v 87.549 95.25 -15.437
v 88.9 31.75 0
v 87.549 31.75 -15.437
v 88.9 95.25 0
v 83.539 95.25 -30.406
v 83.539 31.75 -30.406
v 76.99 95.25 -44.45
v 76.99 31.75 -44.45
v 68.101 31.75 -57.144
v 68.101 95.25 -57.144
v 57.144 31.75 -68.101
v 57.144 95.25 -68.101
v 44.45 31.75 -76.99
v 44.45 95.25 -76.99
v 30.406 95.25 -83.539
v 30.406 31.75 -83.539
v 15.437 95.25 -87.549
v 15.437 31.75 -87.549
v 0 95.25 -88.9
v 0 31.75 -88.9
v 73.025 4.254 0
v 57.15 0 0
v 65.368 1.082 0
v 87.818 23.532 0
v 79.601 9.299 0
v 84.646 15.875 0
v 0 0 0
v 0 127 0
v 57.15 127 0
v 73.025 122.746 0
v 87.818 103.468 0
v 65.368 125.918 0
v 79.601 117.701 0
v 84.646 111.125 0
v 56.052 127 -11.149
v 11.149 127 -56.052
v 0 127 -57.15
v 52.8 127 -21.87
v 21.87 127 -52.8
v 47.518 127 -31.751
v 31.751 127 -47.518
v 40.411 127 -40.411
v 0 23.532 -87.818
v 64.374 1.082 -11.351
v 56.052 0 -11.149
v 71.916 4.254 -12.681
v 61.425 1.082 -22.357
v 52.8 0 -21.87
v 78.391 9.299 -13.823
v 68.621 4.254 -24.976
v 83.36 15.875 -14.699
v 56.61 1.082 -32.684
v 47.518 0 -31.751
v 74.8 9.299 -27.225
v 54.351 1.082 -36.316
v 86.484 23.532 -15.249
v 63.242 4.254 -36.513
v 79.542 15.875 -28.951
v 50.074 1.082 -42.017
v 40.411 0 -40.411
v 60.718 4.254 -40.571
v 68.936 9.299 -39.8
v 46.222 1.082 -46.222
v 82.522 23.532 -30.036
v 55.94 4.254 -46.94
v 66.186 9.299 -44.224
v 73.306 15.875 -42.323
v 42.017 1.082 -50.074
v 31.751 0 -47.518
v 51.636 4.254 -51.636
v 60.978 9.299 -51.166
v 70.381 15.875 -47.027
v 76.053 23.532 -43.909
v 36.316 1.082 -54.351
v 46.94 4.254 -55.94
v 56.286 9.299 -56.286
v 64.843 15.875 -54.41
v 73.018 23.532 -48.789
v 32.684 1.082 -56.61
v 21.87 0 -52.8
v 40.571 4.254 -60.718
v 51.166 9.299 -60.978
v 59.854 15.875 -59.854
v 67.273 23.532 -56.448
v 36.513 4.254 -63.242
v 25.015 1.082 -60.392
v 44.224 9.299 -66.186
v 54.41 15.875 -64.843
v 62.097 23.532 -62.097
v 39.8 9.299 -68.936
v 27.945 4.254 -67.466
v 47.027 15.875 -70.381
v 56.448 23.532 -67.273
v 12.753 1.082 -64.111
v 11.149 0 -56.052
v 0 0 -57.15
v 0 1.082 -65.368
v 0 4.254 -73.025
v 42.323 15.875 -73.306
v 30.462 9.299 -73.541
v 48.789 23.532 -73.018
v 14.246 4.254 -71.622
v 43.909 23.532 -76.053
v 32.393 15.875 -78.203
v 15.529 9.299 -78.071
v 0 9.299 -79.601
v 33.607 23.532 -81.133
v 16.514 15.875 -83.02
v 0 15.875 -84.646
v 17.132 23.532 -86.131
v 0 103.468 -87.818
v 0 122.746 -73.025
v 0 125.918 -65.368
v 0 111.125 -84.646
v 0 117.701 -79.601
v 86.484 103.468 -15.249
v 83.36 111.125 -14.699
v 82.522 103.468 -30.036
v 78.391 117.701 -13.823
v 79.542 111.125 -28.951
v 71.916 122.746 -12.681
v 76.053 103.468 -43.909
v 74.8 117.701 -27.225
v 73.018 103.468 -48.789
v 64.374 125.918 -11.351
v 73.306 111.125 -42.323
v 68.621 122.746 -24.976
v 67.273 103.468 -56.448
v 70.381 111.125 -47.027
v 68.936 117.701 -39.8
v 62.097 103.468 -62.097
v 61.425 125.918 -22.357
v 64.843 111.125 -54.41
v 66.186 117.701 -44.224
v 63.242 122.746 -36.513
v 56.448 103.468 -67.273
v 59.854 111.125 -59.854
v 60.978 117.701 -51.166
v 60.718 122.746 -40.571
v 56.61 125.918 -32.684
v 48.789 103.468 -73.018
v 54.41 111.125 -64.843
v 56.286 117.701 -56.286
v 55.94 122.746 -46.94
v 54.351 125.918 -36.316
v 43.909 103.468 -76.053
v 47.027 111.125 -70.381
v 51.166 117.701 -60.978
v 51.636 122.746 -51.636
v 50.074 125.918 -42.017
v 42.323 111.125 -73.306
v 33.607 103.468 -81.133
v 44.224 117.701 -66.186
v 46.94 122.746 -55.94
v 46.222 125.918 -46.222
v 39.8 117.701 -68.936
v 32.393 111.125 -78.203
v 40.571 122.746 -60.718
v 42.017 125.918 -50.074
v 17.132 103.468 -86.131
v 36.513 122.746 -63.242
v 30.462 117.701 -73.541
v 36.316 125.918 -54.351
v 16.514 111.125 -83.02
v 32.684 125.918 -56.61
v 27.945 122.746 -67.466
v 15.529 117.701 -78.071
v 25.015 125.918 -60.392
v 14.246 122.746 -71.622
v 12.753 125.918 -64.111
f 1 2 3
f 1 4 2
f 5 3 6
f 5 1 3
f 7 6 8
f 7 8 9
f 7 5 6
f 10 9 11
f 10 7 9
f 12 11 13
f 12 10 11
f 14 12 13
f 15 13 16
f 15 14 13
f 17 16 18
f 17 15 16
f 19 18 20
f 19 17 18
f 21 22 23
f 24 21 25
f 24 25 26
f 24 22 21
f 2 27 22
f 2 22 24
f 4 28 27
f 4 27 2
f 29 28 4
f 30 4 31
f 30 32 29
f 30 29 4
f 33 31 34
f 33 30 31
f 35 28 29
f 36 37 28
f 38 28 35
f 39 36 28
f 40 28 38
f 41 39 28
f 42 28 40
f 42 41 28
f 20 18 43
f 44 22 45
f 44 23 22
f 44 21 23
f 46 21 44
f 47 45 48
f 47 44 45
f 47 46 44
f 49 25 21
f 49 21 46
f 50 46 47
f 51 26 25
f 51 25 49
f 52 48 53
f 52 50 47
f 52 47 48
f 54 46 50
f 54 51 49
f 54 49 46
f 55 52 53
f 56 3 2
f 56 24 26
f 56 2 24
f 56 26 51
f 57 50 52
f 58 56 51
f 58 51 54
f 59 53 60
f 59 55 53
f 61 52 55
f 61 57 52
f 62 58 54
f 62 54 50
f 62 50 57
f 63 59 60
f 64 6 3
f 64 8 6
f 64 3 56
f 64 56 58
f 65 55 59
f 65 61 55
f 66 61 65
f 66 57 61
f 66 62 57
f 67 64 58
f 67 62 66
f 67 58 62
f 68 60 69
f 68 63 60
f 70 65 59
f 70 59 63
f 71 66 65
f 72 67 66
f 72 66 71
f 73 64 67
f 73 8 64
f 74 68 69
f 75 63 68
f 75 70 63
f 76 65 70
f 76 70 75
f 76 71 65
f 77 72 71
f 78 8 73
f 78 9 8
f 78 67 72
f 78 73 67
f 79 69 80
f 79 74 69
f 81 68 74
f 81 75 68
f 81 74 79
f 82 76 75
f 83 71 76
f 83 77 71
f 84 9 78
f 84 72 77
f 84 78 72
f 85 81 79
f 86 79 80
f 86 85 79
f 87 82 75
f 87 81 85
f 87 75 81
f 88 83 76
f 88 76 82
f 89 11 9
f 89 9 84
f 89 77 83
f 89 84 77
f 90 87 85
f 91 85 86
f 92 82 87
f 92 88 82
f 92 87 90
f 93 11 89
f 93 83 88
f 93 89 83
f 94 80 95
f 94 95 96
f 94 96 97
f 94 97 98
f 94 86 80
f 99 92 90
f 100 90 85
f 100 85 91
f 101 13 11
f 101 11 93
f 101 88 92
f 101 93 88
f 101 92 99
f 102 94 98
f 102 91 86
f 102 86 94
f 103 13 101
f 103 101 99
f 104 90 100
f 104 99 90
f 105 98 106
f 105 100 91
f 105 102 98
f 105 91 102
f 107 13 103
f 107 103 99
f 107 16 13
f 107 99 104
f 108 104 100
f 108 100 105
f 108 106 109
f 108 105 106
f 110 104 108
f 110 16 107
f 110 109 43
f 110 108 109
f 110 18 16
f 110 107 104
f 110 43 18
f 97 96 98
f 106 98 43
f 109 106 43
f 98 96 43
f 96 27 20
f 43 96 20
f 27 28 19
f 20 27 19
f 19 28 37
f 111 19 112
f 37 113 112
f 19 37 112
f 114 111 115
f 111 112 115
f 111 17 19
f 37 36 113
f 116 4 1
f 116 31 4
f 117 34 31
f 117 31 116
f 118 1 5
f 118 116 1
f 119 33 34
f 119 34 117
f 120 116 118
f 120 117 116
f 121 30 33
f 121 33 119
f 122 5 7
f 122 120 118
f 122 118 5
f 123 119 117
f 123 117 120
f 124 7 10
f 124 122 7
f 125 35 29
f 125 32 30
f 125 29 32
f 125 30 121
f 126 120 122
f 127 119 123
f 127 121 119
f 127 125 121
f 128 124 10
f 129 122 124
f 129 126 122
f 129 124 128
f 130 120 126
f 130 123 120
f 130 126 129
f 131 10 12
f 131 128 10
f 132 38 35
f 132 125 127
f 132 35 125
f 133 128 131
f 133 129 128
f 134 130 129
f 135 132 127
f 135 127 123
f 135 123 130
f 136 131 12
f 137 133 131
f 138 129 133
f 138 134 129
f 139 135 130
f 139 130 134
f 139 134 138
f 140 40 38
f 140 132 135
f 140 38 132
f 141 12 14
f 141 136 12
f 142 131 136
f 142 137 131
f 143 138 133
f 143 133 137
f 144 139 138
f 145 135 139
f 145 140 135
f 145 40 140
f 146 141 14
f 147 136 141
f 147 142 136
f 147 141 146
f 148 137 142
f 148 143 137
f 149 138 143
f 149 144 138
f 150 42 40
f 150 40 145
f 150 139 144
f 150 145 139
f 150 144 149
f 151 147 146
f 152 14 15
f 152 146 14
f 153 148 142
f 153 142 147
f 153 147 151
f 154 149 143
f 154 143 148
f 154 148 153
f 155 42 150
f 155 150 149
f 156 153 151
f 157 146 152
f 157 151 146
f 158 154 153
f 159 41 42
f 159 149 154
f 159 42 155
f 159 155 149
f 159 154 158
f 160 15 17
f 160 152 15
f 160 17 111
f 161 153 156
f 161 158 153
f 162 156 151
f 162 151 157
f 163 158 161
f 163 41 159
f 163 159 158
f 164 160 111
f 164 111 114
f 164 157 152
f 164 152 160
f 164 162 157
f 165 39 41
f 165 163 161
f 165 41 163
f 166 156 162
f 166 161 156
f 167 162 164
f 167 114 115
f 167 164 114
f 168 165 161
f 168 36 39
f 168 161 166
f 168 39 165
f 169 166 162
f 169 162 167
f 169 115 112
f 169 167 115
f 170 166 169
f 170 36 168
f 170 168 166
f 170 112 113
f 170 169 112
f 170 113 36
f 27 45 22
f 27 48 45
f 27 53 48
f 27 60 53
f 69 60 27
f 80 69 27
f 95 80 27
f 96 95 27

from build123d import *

# Parameters (mm, degrees)
REVOLVE1_ANGLE = 90


with BuildPart() as part:
    # Sketch1 → Revolve1 (revolve)
    with BuildSketch(Plane.XY):
        with BuildLine():
            Line((0, 0), (57.15, 0))
            ThreePointArc((57.15, 0), (79.600640303, 9.299359697), (88.9, 31.75))
            Line((88.9, 31.75), (88.9, 95.25))
            ThreePointArc((88.9, 95.25), (79.600640303, 117.700640303), (57.15, 127))
            Line((57.15, 127), (0, 127))
            Line((0, 127), (0, 0))
        make_face()
    revolve(axis=Axis((0, 0, 0), (0, 1, 0)), revolution_arc=REVOLVE1_ANGLE)


solid = part.part
